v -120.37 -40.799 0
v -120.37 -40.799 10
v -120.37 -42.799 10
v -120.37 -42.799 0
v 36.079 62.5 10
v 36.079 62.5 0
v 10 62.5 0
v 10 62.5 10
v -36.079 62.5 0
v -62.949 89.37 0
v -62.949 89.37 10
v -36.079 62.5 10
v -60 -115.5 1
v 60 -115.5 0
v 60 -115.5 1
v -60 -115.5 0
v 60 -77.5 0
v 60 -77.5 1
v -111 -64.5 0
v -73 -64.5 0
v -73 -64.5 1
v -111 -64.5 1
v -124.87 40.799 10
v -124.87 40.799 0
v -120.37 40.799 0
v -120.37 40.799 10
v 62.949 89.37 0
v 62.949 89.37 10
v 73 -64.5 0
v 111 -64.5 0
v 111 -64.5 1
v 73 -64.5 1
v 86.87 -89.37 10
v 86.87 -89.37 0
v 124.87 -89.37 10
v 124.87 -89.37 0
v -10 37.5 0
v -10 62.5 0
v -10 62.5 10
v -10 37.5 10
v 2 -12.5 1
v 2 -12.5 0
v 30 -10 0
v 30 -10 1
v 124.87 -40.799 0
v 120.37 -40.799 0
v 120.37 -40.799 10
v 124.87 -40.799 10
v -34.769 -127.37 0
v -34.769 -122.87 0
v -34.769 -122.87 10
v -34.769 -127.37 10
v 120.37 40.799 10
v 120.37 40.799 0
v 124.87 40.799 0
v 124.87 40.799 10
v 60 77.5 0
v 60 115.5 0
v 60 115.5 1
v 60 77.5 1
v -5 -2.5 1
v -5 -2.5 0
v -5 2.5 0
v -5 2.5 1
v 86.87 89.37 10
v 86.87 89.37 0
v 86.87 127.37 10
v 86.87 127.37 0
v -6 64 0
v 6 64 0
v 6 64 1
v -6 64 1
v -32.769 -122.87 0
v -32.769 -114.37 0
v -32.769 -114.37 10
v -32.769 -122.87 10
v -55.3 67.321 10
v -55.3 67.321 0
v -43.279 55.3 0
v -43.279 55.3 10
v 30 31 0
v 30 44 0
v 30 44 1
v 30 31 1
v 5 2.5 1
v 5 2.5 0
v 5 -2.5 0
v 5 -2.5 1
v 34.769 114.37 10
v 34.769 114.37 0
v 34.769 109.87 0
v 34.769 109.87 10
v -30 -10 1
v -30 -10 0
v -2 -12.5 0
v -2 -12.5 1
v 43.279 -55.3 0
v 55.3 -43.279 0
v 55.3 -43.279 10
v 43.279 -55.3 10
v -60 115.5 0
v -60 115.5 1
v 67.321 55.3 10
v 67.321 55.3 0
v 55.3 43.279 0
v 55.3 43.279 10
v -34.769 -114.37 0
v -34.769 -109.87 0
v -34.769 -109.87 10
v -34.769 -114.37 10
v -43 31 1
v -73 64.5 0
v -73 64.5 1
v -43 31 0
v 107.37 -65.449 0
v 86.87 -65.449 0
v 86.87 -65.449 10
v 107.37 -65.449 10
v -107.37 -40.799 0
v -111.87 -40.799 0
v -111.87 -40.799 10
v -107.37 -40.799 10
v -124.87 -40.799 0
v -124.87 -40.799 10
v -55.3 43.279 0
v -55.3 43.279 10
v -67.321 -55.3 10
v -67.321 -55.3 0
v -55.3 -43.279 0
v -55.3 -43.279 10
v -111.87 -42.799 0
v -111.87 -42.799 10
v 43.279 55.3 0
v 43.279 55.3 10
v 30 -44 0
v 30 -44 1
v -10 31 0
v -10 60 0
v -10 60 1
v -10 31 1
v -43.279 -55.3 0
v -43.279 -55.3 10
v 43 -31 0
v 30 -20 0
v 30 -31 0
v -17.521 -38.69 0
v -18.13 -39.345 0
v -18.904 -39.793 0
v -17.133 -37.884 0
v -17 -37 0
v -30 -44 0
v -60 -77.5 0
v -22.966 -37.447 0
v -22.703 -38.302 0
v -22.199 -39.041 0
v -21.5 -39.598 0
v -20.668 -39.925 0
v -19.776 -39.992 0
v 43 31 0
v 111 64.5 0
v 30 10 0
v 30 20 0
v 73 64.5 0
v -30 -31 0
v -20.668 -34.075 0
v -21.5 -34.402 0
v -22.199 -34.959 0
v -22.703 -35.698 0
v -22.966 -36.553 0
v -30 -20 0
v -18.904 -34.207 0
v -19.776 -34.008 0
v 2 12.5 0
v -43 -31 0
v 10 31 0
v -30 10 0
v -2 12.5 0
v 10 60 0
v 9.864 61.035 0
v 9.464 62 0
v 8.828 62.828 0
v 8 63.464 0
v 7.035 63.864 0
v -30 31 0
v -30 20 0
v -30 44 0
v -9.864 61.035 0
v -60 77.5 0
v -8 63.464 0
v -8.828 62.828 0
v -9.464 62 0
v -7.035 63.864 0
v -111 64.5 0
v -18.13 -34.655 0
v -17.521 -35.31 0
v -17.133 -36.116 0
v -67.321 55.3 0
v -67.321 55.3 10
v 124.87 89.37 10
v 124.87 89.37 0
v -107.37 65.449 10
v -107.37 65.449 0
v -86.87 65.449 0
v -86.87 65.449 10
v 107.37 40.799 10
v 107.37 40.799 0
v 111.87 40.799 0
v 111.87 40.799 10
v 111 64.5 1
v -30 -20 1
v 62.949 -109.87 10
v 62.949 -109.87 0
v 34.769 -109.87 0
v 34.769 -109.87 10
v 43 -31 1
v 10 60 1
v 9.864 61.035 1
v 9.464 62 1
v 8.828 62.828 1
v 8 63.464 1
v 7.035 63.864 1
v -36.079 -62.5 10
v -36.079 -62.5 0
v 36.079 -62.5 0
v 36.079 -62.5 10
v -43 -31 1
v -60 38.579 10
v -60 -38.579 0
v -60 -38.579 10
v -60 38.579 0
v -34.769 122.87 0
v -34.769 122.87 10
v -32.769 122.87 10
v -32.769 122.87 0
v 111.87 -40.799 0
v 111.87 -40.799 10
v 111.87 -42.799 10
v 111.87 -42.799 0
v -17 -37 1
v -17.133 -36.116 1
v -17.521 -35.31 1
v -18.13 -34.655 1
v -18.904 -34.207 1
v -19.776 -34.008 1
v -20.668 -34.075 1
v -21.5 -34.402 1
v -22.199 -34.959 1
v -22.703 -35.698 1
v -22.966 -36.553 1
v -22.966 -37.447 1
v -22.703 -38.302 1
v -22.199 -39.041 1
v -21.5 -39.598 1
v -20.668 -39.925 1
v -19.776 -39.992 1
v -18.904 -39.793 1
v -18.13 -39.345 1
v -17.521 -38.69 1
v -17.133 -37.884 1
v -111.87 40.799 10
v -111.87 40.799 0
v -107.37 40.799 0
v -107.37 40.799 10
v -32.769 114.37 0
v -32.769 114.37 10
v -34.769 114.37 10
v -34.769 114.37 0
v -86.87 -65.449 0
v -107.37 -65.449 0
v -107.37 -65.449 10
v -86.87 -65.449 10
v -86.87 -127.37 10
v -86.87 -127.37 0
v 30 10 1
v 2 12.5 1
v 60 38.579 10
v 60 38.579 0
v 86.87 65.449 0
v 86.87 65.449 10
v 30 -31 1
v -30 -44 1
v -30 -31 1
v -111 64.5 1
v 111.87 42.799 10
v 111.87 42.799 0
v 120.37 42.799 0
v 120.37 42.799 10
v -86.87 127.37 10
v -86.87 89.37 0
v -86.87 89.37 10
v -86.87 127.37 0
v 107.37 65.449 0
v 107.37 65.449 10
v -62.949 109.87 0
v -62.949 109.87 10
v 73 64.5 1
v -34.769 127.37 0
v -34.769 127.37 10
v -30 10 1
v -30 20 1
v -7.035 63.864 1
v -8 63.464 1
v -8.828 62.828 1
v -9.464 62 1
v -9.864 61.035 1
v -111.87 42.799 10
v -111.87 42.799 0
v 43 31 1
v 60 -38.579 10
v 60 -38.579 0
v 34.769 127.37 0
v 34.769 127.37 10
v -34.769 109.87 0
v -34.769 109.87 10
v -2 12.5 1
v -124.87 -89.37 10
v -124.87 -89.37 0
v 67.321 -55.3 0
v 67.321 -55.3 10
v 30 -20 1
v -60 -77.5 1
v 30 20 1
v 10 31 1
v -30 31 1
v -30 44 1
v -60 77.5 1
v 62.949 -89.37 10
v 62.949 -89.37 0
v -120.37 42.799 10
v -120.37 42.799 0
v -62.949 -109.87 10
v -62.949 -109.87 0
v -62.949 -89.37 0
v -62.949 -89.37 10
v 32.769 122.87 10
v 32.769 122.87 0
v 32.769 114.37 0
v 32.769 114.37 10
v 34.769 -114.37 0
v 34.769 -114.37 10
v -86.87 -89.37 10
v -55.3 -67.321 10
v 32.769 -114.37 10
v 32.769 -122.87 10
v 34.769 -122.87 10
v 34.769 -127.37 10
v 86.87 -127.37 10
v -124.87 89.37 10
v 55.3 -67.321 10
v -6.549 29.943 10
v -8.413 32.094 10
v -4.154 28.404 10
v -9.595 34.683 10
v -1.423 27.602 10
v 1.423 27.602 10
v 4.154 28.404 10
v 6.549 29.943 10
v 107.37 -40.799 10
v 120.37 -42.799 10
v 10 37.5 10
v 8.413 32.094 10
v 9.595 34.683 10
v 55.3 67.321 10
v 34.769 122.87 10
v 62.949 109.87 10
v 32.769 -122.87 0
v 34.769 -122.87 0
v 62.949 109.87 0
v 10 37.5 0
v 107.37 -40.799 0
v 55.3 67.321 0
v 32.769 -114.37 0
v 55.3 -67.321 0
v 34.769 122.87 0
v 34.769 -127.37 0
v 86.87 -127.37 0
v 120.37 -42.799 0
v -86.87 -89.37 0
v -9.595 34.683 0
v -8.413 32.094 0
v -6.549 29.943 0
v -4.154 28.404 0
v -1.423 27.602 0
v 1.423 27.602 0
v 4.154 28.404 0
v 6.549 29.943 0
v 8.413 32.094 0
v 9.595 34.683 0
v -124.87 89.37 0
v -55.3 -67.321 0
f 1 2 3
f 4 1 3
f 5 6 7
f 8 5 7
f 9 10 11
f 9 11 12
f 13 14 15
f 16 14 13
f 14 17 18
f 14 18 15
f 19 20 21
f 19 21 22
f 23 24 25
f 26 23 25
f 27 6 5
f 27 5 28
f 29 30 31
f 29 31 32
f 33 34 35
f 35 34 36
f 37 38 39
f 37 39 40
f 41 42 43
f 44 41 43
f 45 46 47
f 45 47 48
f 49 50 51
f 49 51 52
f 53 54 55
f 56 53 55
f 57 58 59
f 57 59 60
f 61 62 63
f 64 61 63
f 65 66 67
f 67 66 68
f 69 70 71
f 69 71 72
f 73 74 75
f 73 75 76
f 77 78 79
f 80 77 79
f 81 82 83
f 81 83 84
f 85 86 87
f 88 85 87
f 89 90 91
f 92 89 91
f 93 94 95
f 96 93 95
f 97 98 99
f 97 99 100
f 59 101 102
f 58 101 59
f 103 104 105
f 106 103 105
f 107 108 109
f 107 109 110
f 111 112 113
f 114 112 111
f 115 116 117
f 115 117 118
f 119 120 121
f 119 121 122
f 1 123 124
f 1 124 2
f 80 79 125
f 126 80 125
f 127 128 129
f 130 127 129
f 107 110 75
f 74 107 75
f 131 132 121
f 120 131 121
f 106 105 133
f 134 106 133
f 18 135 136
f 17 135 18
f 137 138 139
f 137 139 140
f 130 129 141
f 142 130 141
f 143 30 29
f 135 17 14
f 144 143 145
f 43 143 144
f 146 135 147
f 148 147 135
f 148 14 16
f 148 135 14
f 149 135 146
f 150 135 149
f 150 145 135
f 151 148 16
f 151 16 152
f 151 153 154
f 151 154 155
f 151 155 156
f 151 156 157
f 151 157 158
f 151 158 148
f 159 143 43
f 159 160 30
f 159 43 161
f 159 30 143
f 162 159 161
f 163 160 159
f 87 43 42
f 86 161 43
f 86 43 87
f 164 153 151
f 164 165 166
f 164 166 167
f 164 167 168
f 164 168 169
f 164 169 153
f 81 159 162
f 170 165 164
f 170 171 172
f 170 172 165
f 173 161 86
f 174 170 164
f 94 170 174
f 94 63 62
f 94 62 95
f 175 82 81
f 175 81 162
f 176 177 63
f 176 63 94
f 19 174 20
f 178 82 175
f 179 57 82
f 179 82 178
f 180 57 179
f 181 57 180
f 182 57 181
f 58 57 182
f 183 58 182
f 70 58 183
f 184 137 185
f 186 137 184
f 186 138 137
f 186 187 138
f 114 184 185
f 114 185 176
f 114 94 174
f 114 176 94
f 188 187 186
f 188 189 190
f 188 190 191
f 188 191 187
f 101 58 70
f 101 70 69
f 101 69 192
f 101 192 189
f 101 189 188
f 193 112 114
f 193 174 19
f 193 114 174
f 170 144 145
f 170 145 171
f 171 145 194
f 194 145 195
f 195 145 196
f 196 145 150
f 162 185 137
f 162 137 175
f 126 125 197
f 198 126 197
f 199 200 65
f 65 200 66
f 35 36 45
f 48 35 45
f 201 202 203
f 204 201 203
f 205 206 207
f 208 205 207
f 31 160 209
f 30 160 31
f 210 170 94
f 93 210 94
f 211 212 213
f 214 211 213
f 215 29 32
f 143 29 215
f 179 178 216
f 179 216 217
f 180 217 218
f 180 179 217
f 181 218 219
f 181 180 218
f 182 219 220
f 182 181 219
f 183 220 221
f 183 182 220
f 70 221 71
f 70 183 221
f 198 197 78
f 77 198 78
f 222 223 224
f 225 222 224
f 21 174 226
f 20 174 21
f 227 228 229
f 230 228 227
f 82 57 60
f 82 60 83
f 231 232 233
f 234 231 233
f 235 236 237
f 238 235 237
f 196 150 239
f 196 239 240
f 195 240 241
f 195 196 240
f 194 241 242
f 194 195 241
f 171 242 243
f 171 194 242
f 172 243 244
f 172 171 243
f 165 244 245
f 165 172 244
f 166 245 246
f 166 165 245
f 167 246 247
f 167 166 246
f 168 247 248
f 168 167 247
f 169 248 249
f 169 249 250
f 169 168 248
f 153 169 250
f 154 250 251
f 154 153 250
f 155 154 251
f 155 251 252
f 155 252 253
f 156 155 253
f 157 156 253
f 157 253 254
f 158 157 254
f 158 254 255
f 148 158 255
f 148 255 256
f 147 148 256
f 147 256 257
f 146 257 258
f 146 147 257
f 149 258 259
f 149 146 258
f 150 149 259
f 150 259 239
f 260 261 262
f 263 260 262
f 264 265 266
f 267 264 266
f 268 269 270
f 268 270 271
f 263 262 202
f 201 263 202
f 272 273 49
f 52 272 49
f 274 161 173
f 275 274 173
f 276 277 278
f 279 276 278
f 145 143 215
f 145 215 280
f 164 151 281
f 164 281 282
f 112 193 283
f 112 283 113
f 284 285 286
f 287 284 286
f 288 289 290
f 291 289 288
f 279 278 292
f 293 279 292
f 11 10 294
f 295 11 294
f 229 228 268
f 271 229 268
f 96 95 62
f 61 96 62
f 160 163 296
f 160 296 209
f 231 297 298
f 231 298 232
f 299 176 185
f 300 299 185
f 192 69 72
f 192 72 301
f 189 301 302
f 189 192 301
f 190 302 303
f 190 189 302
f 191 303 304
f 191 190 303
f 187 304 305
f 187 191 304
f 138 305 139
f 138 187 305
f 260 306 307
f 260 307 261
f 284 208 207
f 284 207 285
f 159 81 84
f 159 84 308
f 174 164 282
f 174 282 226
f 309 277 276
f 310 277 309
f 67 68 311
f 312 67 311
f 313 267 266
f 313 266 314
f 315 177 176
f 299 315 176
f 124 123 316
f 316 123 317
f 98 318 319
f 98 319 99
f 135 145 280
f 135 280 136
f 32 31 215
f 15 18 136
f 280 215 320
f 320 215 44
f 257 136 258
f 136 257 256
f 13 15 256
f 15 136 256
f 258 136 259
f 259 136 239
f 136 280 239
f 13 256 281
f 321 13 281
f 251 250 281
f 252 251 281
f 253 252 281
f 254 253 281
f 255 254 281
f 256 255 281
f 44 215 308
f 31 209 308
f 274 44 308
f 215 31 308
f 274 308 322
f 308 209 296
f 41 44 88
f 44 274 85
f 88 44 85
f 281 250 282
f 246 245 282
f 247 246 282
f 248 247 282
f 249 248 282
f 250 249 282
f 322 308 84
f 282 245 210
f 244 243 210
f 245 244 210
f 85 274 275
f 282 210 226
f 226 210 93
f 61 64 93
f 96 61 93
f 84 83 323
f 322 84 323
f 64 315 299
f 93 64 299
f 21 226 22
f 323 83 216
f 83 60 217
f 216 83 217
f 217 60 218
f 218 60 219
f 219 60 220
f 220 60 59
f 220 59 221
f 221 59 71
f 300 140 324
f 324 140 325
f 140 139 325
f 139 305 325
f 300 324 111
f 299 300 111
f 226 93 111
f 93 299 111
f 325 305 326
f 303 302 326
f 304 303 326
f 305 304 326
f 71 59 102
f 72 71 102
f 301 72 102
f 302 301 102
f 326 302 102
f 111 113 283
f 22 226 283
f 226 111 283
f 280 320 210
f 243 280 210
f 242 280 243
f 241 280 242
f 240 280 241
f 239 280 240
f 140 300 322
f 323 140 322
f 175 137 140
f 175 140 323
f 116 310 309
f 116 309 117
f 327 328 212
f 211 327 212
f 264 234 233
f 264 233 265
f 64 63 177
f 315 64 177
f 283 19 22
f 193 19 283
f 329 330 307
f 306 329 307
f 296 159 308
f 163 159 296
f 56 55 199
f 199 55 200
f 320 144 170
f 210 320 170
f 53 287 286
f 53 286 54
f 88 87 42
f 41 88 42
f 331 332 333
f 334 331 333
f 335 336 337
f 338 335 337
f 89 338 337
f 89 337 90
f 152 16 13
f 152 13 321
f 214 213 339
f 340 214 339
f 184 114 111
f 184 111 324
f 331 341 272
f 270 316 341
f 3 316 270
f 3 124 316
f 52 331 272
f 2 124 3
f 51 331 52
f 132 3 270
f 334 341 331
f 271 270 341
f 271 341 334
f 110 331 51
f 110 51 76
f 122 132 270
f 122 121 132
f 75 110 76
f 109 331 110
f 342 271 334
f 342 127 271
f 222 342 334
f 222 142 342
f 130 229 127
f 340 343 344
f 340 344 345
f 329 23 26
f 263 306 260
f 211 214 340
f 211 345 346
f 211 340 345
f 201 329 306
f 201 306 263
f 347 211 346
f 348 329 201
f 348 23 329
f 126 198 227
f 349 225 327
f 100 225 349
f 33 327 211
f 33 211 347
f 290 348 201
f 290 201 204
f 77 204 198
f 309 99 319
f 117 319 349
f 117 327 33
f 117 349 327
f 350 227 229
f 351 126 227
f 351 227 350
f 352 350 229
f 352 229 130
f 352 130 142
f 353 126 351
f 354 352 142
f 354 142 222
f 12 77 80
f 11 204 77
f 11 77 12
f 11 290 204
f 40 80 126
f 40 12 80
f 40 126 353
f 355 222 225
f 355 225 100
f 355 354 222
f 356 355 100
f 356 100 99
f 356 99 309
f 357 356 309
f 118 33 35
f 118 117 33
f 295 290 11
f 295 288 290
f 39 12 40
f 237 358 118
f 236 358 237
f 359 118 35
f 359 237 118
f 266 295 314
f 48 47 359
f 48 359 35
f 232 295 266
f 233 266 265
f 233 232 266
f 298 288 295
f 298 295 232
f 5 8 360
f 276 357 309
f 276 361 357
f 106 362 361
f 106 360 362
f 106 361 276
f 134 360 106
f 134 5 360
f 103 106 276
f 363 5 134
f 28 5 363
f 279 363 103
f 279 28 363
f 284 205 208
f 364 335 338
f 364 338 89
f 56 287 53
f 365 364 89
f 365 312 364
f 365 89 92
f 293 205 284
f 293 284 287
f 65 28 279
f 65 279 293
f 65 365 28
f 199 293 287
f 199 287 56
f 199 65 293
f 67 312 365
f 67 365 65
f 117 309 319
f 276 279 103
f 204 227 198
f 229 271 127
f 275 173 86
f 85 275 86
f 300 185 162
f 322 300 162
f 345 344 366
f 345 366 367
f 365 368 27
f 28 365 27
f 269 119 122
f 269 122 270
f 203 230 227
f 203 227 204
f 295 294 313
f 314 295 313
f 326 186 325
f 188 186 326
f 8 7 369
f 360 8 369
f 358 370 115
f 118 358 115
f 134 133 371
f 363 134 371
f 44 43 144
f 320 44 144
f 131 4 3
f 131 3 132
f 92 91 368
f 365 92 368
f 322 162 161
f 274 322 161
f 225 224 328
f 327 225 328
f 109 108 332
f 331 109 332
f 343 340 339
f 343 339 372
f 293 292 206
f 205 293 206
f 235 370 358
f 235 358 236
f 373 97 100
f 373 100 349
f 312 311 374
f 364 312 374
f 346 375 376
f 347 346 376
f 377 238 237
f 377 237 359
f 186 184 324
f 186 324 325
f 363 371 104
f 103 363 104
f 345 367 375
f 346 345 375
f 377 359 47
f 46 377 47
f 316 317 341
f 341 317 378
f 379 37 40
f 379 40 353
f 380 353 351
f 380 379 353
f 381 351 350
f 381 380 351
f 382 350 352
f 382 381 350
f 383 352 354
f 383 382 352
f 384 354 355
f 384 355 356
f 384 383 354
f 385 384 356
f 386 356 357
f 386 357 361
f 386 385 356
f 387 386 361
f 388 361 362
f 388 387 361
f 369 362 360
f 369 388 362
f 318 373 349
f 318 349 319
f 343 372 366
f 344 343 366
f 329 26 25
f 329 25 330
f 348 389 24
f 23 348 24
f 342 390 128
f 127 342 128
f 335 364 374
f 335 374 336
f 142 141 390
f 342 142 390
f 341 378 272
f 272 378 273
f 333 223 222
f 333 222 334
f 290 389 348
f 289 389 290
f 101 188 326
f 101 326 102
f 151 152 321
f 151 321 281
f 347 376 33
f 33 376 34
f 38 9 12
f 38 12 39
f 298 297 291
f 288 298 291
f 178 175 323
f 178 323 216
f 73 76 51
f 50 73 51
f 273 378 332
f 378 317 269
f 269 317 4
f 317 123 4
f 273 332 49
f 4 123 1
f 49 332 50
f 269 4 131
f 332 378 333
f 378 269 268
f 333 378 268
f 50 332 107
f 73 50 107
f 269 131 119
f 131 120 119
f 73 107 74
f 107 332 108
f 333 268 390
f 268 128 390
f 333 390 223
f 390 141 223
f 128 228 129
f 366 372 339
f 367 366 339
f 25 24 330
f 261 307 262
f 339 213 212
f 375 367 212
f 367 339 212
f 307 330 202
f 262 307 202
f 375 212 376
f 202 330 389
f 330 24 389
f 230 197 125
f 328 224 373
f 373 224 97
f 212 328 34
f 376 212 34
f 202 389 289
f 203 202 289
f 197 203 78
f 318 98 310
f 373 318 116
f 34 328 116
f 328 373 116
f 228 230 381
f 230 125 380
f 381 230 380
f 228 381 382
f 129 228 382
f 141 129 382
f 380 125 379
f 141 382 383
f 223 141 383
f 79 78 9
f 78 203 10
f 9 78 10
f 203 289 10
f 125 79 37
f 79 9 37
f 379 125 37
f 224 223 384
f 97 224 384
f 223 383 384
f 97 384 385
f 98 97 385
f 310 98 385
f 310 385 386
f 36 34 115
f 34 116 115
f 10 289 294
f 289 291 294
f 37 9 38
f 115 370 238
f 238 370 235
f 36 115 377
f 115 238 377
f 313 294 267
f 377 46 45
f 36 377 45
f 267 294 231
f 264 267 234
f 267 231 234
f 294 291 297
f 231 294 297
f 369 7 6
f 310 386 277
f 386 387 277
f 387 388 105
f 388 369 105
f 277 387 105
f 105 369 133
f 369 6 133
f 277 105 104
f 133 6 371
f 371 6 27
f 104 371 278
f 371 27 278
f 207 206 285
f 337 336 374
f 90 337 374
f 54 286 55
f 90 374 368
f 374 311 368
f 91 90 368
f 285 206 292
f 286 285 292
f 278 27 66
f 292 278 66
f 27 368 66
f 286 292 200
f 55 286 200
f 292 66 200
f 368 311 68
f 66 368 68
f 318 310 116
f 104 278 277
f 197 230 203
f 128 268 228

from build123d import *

# Parameters (mm, degrees)
PAD_DEPTH    = 10
SKETCH001_R  = 3
PAD001_DEPTH = 1


with BuildPart() as body:
    # Sketch → Pad (new body)
    with BuildSketch(Plane.XY):
        with BuildLine():
            Line((-36.079185, -62.5), (36.079185, -62.5))
            Line((36.079185, -62.5), (62.949242, -89.370058))
            Line((62.949242, -89.370058), (62.949242, -109.870058))
            Line((62.949242, -109.870058), (59.949242, -109.870058))
            Line((59.949242, -109.870058), (48.769242, -109.870058))
            Line((48.769242, -109.870058), (34.769242, -109.870058))
            Line((34.769242, -109.870058), (34.769242, -114.370058))
            Line((34.769242, -114.370058), (32.769242, -114.370058))
            Line((32.769242, -114.370058), (32.769242, -122.870058))
            Line((32.769242, -122.870058), (34.769242, -122.870058))
            Line((34.769242, -122.870058), (34.769242, -127.370058))
            Line((34.769242, -127.370058), (48.769242, -127.370058))
            Line((48.769242, -127.370058), (59.949242, -127.370058))
            Line((59.949242, -127.370058), (62.949242, -127.370058))
            Line((62.949242, -127.370058), (86.870058, -127.370058))
            Line((86.870058, -127.370058), (86.870058, -89.370058))
            Line((86.870058, -89.370058), (124.870058, -89.370058))
            Line((124.870058, -89.370058), (124.870058, -65.449242))
            Line((124.870058, -62.449242), (124.870058, -65.449242))
            Line((124.870058, -54.799242), (124.870058, -62.449242))
            Line((124.870058, -54.799242), (124.870058, -40.799242))
            Line((120.370058, -40.799242), (124.870058, -40.799242))
            Line((120.370058, -42.799242), (120.370058, -40.799242))
            Line((111.870058, -42.799242), (120.370058, -42.799242))
            Line((111.870058, -40.799242), (111.870058, -42.799242))
            Line((107.370058, -40.799242), (111.870058, -40.799242))
            Line((107.370058, -40.799242), (107.370058, -54.799242))
            Line((107.370058, -62.449242), (107.370058, -54.799242))
            Line((107.370058, -65.449242), (107.370058, -62.449242))
            Line((86.870058, -65.449242), (107.370058, -65.449242))
            Line((60, -38.579185), (86.870058, -65.449242))
            Line((60, 38.579185), (60, -38.579185))
            Line((60, 38.579185), (86.870058, 65.449242))
            Line((86.870058, 65.449242), (107.370058, 65.449242))
            Line((107.370058, 65.449242), (107.370058, 62.449242))
            Line((107.370058, 62.449242), (107.370058, 54.799242))
            Line((107.370058, 54.799242), (107.370058, 40.799242))
            Line((107.370058, 40.799242), (111.870058, 40.799242))
            Line((111.870058, 40.799242), (111.870058, 42.799242))
            Line((111.870058, 42.799242), (120.370058, 42.799242))
            Line((120.370058, 42.799242), (120.370058, 40.799242))
            Line((120.370058, 40.799242), (124.870058, 40.799242))
            Line((124.870058, 40.799242), (124.870058, 54.799242))
            Line((124.870058, 54.799242), (124.870058, 62.449242))
            Line((124.870058, 62.449242), (124.870058, 65.449242))
            Line((124.870058, 65.449242), (124.870058, 89.370058))
            Line((124.870058, 89.370058), (86.870058, 89.370058))
            Line((86.870058, 89.370058), (86.870058, 127.370058))
            Line((86.870058, 127.370058), (62.949242, 127.370058))
            Line((62.949242, 127.370058), (59.949242, 127.370058))
            Line((59.949242, 127.370058), (48.769242, 127.370058))
            Line((48.769242, 127.370058), (34.769242, 127.370058))
            Line((34.769242, 127.370058), (34.769242, 122.870058))
            Line((34.769242, 122.870058), (32.769242, 122.870058))
            Line((32.769242, 122.870058), (32.769242, 114.370058))
            Line((32.769242, 114.370058), (34.769242, 114.370058))
            Line((34.769242, 114.370058), (34.769242, 109.870058))
            Line((34.769242, 109.870058), (48.769242, 109.870058))
            Line((48.769242, 109.870058), (59.949242, 109.870058))
            Line((59.949242, 109.870058), (62.949242, 109.870058))
            Line((62.949242, 109.870058), (62.949242, 89.370058))
            Line((36.079185, 62.5), (62.949242, 89.370058))
            Line((36.079185, 62.5), (10, 62.5))
            Line((10, 62.5), (10, 37.5))
            ThreePointArc((-10, 37.5), (0, 27.5), (10, 37.5))
            Line((-10, 62.5), (-10, 37.5))
            Line((-36.079185, 62.5), (-10, 62.5))
            Line((-62.949242, 89.370058), (-36.079185, 62.5))
            Line((-62.949242, 89.370058), (-62.949242, 109.870058))
            Line((-62.949242, 109.870058), (-59.949242, 109.870058))
            Line((-48.769242, 109.870058), (-59.949242, 109.870058))
            Line((-34.769242, 109.870058), (-48.769242, 109.870058))
            Line((-34.769242, 114.370058), (-34.769242, 109.870058))
            Line((-32.769242, 114.370058), (-34.769242, 114.370058))
            Line((-32.769242, 122.870058), (-32.769242, 114.370058))
            Line((-34.769242, 122.870058), (-32.769242, 122.870058))
            Line((-34.769242, 127.370058), (-34.769242, 122.870058))
            Line((-48.769242, 127.370058), (-34.769242, 127.370058))
            Line((-59.949242, 127.370058), (-48.769242, 127.370058))
            Line((-59.949242, 127.370058), (-62.949242, 127.370058))
            Line((-86.870058, 127.370058), (-62.949242, 127.370058))
            Line((-86.870058, 89.370058), (-86.870058, 127.370058))
            Line((-124.870058, 89.370058), (-86.870058, 89.370058))
            Line((-124.870058, 65.449242), (-124.870058, 89.370058))
            Line((-124.870058, 65.449242), (-124.870058, 62.449242))
            Line((-124.870058, 62.449242), (-124.870058, 54.799242))
            Line((-124.870058, 54.799242), (-124.870058, 40.799242))
            Line((-124.870058, 40.799242), (-120.370058, 40.799242))
            Line((-120.370058, 40.799242), (-120.370058, 42.799242))
            Line((-120.370058, 42.799242), (-111.870058, 42.799242))
            Line((-111.870058, 42.799242), (-111.870058, 40.799242))
            Line((-111.870058, 40.799242), (-107.370058, 40.799242))
            Line((-107.370058, 40.799242), (-107.370058, 54.799242))
            Line((-107.370058, 54.799242), (-107.370058, 62.449242))
            Line((-107.370058, 62.449242), (-107.370058, 65.449242))
            Line((-107.370058, 65.449242), (-86.870058, 65.449242))
            Line((-60, 38.579185), (-86.870058, 65.449242))
            Line((-60, -38.579185), (-60, 38.579185))
            Line((-60, -38.579185), (-86.870058, -65.449242))
            Line((-107.370058, -65.449242), (-86.870058, -65.449242))
            Line((-107.370058, -62.449242), (-107.370058, -65.449242))
            Line((-107.370058, -54.799242), (-107.370058, -62.449242))
            Line((-107.370058, -40.799242), (-107.370058, -54.799242))
            Line((-111.870058, -40.799242), (-107.370058, -40.799242))
            Line((-111.870058, -42.799242), (-111.870058, -40.799242))
            Line((-120.370058, -42.799242), (-111.870058, -42.799242))
            Line((-120.370058, -40.799242), (-120.370058, -42.799242))
            Line((-124.870058, -40.799242), (-120.370058, -40.799242))
            Line((-124.870058, -54.799242), (-124.870058, -40.799242))
            Line((-124.870058, -62.449242), (-124.870058, -54.799242))
            Line((-124.870058, -65.449242), (-124.870058, -62.449242))
            Line((-124.870058, -65.449242), (-124.870058, -89.370058))
            Line((-124.870058, -89.370058), (-86.870058, -89.370058))
            Line((-86.870058, -89.370058), (-86.870058, -127.370058))
            Line((-86.870058, -127.370058), (-62.949242, -127.370058))
            Line((-62.949242, -127.370058), (-59.949242, -127.370058))
            Line((-59.949242, -127.370058), (-48.769242, -127.370058))
            Line((-34.769242, -127.370058), (-48.769242, -127.370058))
            Line((-34.769242, -122.870058), (-34.769242, -127.370058))
            Line((-32.769242, -122.870058), (-34.769242, -122.870058))
            Line((-32.769242, -114.370058), (-32.769242, -122.870058))
            Line((-34.769242, -114.370058), (-32.769242, -114.370058))
            Line((-34.769242, -109.870058), (-34.769242, -114.370058))
            Line((-48.769242, -109.870058), (-34.769242, -109.870058))
            Line((-48.769242, -109.870058), (-59.949242, -109.870058))
            Line((-59.949242, -109.870058), (-62.949242, -109.870058))
            Line((-62.949242, -109.870058), (-62.949242, -89.370058))
            Line((-36.079185, -62.5), (-62.949242, -89.370058))
        make_face()
        Polygon((-55.3, 43.279185), (-67.320815, 55.3), (-55.3, 67.320815), (-43.279185, 55.3), align=None, mode=Mode.SUBTRACT)
        Polygon((43.279185, 55.3), (55.3, 67.320815), (67.320815, 55.3), (55.3, 43.279185), align=None, mode=Mode.SUBTRACT)
        Polygon((43.279185, -55.3), (55.3, -67.320815), (67.320815, -55.3), (55.3, -43.279185), align=None, mode=Mode.SUBTRACT)
        Polygon((-43.279185, -55.3), (-55.3, -67.320815), (-67.320815, -55.3), (-55.3, -43.279185), align=None, mode=Mode.SUBTRACT)
    extrude(amount=PAD_DEPTH)


with BuildPart() as body001:
    # Sketch001 → Pad001 (new body)
    with BuildSketch(Plane.XY):
        Polygon((-30, 31), (-30, 44), (-60, 77.5), (-60, 115.5), (60, 115.5), (60, 77.5), (30, 44), (30, 31), (43, 31), (73, 64.5), (111, 64.5), (111, -64.5), (73, -64.5), (43, -31), (30, -31), (30, -44), (60, -77.5), (60, -115.5), (-60, -115.5), (-60, -77.5), (-30, -44), (-30, -31), (-43, -31), (-73, -64.5), (-111, -64.5), (-111, 64.5), (-73, 64.5), (-43, 31), align=None)
        with Locations((-20, -37)):
            Circle(SKETCH001_R, mode=Mode.SUBTRACT)
        with BuildLine():
            Line((-10, 44), (-10, 31))
            Line((-10, 31), (10, 31))
            Line((10, 31), (10, 44))
            Line((10, 44), (10, 60))
            ThreePointArc((10, 60), (8.828427, 62.828427), (6, 64))
            Line((6, 64), (-6, 64))
            ThreePointArc((-6, 64), (-8.828427, 62.828427), (-10, 60))
            Line((-10, 60), (-10, 44))
        make_face(mode=Mode.SUBTRACT)
        Polygon((-5, -2.5), (-5, 2.5), (-2, 12.5), (-30, 10), (-30, 20), (30, 20), (30, 10), (2, 12.5), (5, 2.5), (5, -2.5), (2, -12.5), (30, -10), (30, -20), (-30, -20), (-30, -10), (-2, -12.5), align=None, mode=Mode.SUBTRACT)
    extrude(amount=PAD001_DEPTH)


solid = Compound([body.part, body001.part])
